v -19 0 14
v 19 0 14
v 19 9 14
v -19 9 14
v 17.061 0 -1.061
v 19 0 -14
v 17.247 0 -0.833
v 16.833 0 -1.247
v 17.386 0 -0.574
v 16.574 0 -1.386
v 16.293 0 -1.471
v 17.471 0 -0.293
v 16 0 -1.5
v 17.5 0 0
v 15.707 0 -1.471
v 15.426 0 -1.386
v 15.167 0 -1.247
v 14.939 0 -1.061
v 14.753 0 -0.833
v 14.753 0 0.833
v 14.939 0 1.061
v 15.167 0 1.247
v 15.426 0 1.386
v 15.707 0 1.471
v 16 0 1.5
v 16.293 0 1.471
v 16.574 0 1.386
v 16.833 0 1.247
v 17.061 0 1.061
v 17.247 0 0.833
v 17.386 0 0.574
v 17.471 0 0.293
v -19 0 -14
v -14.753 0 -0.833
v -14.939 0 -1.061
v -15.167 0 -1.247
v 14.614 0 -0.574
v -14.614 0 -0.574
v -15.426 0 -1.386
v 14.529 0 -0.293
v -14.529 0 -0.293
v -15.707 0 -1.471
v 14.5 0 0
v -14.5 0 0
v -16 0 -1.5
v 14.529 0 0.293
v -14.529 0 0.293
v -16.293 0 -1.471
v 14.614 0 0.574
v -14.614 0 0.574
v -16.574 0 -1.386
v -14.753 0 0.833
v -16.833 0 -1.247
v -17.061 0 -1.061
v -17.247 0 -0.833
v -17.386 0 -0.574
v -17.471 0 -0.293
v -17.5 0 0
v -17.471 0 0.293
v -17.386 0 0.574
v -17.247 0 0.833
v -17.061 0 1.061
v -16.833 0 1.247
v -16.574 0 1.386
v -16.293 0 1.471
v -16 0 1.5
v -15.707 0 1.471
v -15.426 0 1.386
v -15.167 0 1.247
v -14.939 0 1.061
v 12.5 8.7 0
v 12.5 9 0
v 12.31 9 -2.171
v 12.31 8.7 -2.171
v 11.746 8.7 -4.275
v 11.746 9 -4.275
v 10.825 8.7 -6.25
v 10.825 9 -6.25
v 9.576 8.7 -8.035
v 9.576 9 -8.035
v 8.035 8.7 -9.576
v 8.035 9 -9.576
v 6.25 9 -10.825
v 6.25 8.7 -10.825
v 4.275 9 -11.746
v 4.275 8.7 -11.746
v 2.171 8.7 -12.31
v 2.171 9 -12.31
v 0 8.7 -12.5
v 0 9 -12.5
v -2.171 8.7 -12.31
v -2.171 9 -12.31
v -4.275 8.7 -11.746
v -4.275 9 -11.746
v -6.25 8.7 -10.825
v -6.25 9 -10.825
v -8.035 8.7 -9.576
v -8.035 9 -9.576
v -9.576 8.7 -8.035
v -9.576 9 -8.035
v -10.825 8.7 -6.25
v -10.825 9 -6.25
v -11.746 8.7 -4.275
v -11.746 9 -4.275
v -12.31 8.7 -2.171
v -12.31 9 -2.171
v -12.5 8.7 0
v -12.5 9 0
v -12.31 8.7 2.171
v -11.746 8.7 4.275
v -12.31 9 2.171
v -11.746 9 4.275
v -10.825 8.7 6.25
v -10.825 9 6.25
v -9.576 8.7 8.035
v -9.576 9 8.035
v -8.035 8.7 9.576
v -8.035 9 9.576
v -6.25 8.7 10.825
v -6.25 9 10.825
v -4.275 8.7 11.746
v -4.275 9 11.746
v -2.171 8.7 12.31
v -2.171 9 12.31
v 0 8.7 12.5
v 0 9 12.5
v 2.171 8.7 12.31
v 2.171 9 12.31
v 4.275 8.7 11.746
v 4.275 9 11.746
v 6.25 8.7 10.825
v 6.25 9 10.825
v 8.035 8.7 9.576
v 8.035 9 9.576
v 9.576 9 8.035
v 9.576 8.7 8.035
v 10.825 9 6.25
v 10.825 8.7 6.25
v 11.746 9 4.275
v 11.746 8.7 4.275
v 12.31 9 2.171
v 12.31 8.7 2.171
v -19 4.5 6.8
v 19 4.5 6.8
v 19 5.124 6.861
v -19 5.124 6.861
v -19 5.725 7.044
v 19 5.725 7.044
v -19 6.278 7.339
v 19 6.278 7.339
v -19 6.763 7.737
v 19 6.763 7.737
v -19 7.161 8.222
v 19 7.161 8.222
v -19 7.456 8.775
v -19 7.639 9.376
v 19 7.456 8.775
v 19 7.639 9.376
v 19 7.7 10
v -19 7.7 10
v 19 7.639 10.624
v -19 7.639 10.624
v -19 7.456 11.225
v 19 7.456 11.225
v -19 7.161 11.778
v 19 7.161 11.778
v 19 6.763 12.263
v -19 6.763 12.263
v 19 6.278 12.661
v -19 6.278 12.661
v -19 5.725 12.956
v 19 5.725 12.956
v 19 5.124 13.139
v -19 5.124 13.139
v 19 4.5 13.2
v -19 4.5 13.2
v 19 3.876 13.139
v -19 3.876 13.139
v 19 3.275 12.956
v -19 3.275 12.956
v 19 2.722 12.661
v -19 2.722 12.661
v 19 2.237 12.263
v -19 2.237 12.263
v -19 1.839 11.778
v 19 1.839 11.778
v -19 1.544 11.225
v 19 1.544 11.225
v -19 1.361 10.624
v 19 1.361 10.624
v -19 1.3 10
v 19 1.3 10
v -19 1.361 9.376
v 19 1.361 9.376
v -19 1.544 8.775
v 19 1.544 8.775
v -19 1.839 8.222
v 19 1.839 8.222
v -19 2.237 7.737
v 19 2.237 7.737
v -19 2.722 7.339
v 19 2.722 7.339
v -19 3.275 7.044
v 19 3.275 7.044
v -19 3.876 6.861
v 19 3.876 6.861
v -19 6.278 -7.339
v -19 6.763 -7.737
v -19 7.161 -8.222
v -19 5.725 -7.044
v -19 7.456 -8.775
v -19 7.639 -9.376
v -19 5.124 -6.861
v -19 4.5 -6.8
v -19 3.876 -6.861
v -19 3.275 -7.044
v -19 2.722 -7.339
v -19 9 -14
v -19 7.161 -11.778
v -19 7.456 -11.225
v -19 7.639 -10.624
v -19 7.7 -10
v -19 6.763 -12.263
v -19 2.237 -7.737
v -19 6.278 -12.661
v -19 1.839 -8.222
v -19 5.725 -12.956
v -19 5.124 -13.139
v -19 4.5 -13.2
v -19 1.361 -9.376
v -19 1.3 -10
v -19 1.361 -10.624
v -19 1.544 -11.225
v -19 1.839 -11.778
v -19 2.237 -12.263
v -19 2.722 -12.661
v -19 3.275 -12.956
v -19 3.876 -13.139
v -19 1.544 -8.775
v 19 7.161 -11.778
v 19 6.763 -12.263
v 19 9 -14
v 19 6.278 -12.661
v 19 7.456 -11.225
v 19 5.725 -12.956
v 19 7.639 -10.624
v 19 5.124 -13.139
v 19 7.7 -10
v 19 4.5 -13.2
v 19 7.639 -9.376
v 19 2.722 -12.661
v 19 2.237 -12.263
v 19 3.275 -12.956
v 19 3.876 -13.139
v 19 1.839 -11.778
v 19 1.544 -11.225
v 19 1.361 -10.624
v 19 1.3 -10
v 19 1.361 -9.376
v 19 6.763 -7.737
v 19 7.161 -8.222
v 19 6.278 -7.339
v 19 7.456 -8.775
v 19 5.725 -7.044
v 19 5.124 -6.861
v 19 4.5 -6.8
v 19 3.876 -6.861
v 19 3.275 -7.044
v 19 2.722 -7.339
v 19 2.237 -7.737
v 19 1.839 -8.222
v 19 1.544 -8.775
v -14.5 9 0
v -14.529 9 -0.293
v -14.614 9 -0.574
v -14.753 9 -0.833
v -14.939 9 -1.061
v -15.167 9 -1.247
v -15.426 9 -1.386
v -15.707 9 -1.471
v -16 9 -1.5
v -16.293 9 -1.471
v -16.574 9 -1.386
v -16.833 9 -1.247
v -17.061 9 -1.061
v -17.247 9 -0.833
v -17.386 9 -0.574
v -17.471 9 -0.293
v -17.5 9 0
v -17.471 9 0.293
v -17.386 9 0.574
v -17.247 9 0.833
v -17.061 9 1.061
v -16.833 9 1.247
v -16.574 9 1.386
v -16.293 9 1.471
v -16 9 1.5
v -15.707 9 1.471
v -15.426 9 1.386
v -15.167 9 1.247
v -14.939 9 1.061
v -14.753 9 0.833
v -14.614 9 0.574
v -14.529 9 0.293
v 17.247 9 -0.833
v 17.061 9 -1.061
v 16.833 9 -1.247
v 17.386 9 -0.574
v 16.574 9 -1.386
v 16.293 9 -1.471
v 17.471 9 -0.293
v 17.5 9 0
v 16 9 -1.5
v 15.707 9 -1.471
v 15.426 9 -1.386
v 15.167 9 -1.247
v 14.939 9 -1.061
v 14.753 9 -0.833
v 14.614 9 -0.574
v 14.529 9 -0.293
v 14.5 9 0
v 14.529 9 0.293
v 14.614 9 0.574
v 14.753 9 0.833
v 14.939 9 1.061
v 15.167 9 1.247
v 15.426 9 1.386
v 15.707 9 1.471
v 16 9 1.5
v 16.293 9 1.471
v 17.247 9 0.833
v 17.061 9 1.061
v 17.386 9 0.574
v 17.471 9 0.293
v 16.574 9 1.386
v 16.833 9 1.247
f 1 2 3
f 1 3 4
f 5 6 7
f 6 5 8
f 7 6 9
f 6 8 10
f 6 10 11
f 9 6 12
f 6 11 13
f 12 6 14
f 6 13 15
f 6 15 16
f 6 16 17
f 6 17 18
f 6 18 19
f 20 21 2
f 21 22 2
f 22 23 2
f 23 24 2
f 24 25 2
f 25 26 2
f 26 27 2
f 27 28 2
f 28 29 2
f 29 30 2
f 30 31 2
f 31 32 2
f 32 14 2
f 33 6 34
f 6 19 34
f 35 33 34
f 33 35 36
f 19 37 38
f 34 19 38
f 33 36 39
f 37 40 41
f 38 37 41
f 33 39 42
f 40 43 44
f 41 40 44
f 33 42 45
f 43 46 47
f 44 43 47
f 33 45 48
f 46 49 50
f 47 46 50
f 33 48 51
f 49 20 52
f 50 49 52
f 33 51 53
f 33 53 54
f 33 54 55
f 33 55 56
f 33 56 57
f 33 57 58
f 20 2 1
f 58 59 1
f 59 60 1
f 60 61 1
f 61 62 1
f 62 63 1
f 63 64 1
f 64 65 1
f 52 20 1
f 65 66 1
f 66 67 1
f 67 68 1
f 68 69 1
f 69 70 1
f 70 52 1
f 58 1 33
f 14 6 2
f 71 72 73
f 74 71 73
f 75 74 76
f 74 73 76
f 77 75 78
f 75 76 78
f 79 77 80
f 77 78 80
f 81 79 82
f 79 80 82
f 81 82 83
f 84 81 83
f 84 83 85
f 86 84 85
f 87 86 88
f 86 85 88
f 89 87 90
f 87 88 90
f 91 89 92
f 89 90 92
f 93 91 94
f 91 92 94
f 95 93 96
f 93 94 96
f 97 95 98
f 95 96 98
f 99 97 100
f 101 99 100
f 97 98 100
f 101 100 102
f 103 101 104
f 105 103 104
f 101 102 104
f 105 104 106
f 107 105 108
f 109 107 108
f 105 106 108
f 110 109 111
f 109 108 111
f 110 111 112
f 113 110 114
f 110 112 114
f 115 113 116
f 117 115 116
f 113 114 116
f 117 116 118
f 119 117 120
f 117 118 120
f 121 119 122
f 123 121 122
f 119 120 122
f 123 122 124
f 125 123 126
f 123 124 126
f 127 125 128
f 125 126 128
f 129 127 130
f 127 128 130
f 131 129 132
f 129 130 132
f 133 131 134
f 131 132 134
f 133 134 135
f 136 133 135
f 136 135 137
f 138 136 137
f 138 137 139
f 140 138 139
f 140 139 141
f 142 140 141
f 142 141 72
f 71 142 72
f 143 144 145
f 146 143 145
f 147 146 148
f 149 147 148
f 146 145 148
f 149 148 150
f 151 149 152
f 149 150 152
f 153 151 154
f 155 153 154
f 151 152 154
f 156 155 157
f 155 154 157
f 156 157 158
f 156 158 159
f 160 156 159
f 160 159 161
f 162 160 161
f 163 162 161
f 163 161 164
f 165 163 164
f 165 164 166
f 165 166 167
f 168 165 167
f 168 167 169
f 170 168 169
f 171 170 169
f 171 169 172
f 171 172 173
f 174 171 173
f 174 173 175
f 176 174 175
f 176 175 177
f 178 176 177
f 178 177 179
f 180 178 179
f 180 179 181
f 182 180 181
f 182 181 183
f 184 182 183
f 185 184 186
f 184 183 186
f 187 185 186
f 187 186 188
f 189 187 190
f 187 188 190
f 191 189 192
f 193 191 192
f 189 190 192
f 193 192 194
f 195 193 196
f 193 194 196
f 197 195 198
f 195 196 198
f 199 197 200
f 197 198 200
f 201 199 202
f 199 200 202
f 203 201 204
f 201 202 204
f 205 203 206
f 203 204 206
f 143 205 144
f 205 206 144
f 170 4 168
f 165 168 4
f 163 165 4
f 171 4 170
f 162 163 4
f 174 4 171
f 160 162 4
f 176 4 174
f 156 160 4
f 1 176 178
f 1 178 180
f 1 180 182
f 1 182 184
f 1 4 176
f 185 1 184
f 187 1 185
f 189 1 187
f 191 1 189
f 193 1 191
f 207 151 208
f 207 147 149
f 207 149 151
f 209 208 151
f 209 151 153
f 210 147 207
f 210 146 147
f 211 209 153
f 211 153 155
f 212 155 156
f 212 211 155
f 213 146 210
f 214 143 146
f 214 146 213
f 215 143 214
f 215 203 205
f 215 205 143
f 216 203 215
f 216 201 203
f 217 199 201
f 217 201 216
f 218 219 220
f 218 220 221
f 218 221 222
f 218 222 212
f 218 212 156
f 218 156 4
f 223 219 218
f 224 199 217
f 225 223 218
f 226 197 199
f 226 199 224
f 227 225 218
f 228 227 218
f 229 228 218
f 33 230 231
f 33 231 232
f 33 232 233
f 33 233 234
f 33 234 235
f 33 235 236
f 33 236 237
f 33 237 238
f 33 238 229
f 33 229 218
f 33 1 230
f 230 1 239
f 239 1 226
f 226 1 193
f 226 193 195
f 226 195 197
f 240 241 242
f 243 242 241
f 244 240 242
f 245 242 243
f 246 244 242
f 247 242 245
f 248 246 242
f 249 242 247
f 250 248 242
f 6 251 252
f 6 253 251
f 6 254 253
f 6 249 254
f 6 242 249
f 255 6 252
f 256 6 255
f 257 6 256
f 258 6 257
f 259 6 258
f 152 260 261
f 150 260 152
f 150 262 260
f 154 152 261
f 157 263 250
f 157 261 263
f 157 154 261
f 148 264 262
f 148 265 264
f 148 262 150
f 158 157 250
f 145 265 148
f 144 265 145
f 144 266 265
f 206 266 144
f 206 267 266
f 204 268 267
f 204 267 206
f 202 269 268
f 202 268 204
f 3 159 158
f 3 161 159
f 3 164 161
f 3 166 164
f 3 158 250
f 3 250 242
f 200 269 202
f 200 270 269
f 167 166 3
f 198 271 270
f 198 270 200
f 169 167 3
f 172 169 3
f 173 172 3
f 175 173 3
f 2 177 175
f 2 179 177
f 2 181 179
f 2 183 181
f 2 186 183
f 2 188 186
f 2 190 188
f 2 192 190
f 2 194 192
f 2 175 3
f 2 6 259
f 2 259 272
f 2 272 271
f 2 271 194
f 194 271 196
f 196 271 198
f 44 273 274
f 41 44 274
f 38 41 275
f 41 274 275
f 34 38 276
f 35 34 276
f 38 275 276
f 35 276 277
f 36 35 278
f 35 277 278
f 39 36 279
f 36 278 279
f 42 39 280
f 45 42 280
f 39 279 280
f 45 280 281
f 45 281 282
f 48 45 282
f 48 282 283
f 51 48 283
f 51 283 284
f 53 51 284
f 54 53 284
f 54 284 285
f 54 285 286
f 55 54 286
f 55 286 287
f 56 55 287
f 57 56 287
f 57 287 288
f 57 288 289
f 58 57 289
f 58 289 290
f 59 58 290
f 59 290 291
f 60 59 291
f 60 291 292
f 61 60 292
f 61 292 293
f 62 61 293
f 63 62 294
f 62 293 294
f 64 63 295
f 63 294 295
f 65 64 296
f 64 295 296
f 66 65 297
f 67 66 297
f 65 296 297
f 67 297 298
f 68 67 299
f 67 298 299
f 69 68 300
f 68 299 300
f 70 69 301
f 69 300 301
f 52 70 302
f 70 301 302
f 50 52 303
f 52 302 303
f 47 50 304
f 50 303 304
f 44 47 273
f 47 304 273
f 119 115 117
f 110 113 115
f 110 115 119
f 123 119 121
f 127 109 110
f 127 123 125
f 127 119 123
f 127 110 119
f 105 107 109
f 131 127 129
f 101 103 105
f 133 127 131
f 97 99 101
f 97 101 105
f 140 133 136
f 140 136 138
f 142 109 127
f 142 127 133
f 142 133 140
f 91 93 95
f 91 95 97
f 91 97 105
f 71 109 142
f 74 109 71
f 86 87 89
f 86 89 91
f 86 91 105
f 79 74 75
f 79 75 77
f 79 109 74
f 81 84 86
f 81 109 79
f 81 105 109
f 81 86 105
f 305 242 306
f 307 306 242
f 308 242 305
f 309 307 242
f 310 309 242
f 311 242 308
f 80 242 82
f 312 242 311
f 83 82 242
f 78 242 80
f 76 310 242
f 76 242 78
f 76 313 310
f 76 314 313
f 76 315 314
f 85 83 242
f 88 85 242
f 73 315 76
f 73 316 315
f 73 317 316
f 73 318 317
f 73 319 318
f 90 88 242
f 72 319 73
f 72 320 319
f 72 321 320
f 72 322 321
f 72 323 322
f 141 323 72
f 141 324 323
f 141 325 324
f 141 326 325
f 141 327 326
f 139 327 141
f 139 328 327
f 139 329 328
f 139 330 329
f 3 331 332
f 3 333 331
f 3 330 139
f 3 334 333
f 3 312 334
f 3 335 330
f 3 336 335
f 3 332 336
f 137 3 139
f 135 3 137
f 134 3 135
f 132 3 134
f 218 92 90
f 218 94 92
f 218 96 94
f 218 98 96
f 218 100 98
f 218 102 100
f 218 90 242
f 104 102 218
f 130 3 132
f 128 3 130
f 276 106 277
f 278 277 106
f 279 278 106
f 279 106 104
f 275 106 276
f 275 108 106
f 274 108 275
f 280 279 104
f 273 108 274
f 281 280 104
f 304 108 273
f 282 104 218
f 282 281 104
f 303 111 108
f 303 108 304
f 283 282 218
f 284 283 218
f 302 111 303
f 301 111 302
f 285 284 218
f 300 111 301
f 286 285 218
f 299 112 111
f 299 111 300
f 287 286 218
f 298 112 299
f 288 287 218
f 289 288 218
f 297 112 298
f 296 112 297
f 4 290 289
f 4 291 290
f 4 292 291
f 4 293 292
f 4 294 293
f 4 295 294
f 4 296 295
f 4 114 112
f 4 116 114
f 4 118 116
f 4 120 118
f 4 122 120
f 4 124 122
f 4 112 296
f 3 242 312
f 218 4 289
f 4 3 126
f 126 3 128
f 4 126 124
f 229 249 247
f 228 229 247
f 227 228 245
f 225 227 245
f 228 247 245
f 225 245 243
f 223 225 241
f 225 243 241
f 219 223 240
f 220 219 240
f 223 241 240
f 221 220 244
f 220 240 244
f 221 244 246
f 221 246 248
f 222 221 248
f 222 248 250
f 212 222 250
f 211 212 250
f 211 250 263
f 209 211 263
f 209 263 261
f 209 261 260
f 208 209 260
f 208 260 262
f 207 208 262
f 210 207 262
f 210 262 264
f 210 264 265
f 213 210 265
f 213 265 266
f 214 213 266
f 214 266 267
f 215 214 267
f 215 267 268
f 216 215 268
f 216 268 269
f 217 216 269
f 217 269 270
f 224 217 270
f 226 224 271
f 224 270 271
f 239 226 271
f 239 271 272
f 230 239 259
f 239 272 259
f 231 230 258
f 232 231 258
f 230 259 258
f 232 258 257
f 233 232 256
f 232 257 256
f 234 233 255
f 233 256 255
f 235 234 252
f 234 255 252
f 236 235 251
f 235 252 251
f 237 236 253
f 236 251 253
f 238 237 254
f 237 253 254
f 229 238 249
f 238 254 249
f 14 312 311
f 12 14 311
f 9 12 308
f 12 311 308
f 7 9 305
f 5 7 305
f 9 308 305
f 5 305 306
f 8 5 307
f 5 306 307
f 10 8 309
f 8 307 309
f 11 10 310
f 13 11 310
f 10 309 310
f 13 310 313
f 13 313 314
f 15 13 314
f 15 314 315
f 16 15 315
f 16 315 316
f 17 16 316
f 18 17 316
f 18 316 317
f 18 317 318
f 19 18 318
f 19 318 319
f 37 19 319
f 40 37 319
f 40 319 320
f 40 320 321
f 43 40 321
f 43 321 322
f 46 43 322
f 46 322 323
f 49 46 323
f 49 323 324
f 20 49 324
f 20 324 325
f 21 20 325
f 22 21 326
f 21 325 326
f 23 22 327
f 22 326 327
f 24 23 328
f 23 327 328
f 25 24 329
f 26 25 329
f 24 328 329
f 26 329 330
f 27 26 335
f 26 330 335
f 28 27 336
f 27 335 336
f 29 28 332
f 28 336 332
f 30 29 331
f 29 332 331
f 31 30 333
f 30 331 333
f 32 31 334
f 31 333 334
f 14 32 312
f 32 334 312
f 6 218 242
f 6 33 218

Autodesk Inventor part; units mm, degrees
ref_plane "YZ Plane" through (0, 0, 0) normal (1, 0, 0) x (0, 1, 0)
ref_plane "XZ Plane" through (0, 0, 0) normal (0, 1, 0) x (-1, 0, 0)
ref_plane "XY Plane" through (0, 0, 0) normal (0, 0, 1) x (1, 0, 0)
sketch "スケッチ1" plane through (0, 0, 0) normal (0, 1, 0) x (-1, 0, 0)
  line L0 (19, -14) -> (-19, -14)
  line L1 (-19, -14) -> (-19, 14)
  line L2 (-19, 14) -> (19, 14)
  line L3 (19, 14) -> (19, -14)
  line L4 (0, -29.0161) -> (0, 0) construction
  line L5 (0, 0) -> (-35.7009, 0) construction
  dimension "d0" = 28
  dimension "d1" = 38
extrude "押し出し1" add sketch "スケッチ1" along normal blind 9
sketch "スケッチ2" plane through (19, 0, 14) normal (1, 0, 0) x (0, 0, -1)
  circle A0 centre (4, 4.5) radius 3.2
  circle A1 centre (24, 4.5) radius 3.2
  line L0 (14, 0) -> (14, 13.3694) construction
  line L1 (0, 0) -> (28, 0) projected
  dimension "d4" = 6.4
  dimension "d5" = 6.4
  dimension "d6" = 20
  dimension "d7" = 4.5
extrude "押し出し2" cut sketch "スケッチ2" against normal through all
sketch "スケッチ3" plane through (0, 9, 0) normal (0, 1, 0) x (1, 0, 0)
  circle A0 centre (0, 0) radius 12.5
  dimension "d10" = 25
extrude "押し出し3" cut sketch "スケッチ3" against normal blind 0.3
sketch "スケッチ4" plane through (0, 9, 0) normal (0, 1, 0) x (1, 0, 0)
  circle A0 centre (-16, 0) radius 1.5
  circle A1 centre (16, 0) radius 1.5
  line L0 (-19, 14) -> (-19, -14) projected
  line L1 (19, -14) -> (19, 14) projected
  point P0 (0, 0)
  dimension "d13" = 3
  dimension "d14" = 3
  dimension "d15" = 3
  dimension "d16" = 3
extrude "押し出し4" cut sketch "スケッチ4" against normal through all
thread "ねじ1" size "M3x0.5" class "6H" standard "ANSI Metric M Profile" full length
thread "ねじ2" size "M3x0.5" class "6H" standard "ANSI Metric M Profile" full length
properties part number "HayashiProbeHead_sub" material "ステンレス鋼 440C"
